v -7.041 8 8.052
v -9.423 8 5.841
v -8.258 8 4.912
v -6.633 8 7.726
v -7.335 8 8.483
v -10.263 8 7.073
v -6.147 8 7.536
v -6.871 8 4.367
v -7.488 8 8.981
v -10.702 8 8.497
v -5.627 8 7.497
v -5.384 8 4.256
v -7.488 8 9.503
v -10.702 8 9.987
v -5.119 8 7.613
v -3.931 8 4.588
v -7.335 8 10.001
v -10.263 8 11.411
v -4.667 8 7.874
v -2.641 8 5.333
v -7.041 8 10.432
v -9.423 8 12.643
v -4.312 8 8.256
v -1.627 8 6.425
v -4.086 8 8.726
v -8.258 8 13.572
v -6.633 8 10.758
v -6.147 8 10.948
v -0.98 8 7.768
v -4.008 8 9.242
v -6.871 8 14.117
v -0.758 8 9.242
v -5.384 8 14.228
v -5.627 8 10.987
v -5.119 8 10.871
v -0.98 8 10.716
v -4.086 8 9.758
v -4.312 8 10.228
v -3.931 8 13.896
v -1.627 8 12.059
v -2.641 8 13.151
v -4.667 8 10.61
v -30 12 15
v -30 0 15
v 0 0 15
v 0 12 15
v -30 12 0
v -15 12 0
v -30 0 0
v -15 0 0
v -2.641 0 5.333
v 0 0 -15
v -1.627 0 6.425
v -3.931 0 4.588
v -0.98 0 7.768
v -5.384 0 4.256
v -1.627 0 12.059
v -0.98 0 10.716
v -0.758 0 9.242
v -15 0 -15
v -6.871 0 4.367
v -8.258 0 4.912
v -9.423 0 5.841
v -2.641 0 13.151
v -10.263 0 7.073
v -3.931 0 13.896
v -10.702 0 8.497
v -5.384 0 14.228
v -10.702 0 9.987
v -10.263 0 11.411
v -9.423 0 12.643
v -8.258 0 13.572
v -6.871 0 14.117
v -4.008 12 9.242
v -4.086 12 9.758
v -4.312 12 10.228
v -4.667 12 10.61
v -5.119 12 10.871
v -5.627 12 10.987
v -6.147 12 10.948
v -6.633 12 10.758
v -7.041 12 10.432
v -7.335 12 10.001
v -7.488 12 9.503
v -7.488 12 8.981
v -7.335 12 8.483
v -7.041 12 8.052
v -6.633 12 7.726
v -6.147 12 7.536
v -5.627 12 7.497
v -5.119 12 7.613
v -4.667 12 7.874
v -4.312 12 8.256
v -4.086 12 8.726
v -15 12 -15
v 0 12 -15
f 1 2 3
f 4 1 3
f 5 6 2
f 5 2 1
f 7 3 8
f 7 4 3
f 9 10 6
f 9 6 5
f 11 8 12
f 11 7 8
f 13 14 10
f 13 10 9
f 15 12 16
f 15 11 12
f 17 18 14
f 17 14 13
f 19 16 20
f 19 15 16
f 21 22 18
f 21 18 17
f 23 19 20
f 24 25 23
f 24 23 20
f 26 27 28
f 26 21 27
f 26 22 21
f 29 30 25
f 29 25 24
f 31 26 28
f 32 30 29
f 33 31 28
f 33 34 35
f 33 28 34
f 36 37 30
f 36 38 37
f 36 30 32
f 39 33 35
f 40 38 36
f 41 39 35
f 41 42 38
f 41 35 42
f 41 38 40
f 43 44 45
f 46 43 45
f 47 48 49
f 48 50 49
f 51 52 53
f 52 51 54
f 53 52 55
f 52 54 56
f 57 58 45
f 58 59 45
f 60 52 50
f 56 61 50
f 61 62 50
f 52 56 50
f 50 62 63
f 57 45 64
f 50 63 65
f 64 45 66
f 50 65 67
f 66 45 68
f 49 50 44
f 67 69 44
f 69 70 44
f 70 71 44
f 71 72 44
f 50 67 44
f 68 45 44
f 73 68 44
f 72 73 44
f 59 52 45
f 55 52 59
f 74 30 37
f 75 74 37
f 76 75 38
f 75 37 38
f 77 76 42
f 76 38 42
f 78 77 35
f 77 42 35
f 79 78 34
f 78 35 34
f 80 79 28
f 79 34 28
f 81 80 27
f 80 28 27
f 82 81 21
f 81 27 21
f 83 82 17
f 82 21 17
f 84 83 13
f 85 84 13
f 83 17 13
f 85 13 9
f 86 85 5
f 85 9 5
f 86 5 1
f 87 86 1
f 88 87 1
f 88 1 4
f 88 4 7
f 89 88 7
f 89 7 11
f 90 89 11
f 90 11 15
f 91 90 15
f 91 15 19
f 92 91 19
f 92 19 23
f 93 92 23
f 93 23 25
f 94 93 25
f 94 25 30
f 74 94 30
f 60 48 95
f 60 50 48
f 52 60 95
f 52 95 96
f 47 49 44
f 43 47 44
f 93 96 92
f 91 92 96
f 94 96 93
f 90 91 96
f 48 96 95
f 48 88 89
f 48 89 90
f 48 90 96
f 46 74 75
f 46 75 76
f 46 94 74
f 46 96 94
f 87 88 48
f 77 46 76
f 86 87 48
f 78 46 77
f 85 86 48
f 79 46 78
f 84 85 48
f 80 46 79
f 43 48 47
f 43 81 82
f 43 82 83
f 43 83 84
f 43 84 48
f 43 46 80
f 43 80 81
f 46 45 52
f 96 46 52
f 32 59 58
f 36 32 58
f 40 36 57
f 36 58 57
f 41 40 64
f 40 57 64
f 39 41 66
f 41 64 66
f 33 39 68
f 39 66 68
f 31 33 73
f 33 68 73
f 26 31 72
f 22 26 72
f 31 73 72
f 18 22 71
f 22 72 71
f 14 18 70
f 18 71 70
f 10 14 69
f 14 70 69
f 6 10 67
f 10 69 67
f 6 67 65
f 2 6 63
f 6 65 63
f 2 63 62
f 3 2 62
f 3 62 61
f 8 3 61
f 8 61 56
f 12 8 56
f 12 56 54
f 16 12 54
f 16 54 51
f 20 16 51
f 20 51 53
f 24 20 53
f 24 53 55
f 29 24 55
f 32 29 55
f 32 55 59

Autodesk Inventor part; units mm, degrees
ref_plane "YZ Plane" through (0, 0, 0) normal (1, 0, 0) x (0, 1, 0)
ref_plane "XZ Plane" through (0, 0, 0) normal (0, 1, 0) x (-1, 0, 0)
ref_plane "XY Plane" through (0, 0, 0) normal (0, 0, 1) x (1, 0, 0)
sketch "Szkic1" plane through (0, 0, 0) normal (0, 1, 0) x (-1, 0, 0)
  line L0 (0, 0) -> (30, 0)
  line L1 (30, 0) -> (30, 15)
  line L2 (30, 15) -> (0, 15)
  line L3 (0, 15) -> (0, 0)
  line L4 (0, 0) -> (15, 0)
  line L5 (15, 0) -> (15, -15)
  line L6 (15, -15) -> (0, -15)
  line L7 (0, -15) -> (0, 0)
  dimension "d0" = 30
  dimension "d1" = 15
  dimension "d2" = 15
  dimension "d3" = 15
extrude "Wyciągnięcie proste1" add sketch "Szkic1" along normal blind 12
sketch "Szkic2" plane through (0, 0, 0) normal (0, -1, 0) x (1, 0, 0)
  line L0 (0, 9.242) -> (-5.758, 9.242)
  line L1 (-30, 15) -> (0, 15) projected
  line L2 (-5.758, 15) -> (-5.758, 9.242)
  circle A0 centre (-5.758, 9.242) radius 5
  point P0 (0, 0)
  dimension "d6" = 5.758
  dimension "d7" = 5.758
  dimension "d8" = 10
extrude "Wyciągnięcie proste2" cut sketch "Szkic2" against normal blind 8
sketch "Szkic3" plane through (-5.758, 8, 9.242) normal (0, -1, 0) x (1, 0, 0)
  circle A0 centre (0, 0) radius 5 projected
  circle A1 centre (0, 0) radius 1.75
  point P0 (5.758, -9.242)
  dimension "d11" = 3.5
extrude "Wyciągnięcie proste3" cut sketch "Szkic3" against normal blind 4 contours A1
thread "Gwint1" size "M3.5x0.6" class "6H" standard "ANSI Metric M Profile" full length
properties part number "Footer"
